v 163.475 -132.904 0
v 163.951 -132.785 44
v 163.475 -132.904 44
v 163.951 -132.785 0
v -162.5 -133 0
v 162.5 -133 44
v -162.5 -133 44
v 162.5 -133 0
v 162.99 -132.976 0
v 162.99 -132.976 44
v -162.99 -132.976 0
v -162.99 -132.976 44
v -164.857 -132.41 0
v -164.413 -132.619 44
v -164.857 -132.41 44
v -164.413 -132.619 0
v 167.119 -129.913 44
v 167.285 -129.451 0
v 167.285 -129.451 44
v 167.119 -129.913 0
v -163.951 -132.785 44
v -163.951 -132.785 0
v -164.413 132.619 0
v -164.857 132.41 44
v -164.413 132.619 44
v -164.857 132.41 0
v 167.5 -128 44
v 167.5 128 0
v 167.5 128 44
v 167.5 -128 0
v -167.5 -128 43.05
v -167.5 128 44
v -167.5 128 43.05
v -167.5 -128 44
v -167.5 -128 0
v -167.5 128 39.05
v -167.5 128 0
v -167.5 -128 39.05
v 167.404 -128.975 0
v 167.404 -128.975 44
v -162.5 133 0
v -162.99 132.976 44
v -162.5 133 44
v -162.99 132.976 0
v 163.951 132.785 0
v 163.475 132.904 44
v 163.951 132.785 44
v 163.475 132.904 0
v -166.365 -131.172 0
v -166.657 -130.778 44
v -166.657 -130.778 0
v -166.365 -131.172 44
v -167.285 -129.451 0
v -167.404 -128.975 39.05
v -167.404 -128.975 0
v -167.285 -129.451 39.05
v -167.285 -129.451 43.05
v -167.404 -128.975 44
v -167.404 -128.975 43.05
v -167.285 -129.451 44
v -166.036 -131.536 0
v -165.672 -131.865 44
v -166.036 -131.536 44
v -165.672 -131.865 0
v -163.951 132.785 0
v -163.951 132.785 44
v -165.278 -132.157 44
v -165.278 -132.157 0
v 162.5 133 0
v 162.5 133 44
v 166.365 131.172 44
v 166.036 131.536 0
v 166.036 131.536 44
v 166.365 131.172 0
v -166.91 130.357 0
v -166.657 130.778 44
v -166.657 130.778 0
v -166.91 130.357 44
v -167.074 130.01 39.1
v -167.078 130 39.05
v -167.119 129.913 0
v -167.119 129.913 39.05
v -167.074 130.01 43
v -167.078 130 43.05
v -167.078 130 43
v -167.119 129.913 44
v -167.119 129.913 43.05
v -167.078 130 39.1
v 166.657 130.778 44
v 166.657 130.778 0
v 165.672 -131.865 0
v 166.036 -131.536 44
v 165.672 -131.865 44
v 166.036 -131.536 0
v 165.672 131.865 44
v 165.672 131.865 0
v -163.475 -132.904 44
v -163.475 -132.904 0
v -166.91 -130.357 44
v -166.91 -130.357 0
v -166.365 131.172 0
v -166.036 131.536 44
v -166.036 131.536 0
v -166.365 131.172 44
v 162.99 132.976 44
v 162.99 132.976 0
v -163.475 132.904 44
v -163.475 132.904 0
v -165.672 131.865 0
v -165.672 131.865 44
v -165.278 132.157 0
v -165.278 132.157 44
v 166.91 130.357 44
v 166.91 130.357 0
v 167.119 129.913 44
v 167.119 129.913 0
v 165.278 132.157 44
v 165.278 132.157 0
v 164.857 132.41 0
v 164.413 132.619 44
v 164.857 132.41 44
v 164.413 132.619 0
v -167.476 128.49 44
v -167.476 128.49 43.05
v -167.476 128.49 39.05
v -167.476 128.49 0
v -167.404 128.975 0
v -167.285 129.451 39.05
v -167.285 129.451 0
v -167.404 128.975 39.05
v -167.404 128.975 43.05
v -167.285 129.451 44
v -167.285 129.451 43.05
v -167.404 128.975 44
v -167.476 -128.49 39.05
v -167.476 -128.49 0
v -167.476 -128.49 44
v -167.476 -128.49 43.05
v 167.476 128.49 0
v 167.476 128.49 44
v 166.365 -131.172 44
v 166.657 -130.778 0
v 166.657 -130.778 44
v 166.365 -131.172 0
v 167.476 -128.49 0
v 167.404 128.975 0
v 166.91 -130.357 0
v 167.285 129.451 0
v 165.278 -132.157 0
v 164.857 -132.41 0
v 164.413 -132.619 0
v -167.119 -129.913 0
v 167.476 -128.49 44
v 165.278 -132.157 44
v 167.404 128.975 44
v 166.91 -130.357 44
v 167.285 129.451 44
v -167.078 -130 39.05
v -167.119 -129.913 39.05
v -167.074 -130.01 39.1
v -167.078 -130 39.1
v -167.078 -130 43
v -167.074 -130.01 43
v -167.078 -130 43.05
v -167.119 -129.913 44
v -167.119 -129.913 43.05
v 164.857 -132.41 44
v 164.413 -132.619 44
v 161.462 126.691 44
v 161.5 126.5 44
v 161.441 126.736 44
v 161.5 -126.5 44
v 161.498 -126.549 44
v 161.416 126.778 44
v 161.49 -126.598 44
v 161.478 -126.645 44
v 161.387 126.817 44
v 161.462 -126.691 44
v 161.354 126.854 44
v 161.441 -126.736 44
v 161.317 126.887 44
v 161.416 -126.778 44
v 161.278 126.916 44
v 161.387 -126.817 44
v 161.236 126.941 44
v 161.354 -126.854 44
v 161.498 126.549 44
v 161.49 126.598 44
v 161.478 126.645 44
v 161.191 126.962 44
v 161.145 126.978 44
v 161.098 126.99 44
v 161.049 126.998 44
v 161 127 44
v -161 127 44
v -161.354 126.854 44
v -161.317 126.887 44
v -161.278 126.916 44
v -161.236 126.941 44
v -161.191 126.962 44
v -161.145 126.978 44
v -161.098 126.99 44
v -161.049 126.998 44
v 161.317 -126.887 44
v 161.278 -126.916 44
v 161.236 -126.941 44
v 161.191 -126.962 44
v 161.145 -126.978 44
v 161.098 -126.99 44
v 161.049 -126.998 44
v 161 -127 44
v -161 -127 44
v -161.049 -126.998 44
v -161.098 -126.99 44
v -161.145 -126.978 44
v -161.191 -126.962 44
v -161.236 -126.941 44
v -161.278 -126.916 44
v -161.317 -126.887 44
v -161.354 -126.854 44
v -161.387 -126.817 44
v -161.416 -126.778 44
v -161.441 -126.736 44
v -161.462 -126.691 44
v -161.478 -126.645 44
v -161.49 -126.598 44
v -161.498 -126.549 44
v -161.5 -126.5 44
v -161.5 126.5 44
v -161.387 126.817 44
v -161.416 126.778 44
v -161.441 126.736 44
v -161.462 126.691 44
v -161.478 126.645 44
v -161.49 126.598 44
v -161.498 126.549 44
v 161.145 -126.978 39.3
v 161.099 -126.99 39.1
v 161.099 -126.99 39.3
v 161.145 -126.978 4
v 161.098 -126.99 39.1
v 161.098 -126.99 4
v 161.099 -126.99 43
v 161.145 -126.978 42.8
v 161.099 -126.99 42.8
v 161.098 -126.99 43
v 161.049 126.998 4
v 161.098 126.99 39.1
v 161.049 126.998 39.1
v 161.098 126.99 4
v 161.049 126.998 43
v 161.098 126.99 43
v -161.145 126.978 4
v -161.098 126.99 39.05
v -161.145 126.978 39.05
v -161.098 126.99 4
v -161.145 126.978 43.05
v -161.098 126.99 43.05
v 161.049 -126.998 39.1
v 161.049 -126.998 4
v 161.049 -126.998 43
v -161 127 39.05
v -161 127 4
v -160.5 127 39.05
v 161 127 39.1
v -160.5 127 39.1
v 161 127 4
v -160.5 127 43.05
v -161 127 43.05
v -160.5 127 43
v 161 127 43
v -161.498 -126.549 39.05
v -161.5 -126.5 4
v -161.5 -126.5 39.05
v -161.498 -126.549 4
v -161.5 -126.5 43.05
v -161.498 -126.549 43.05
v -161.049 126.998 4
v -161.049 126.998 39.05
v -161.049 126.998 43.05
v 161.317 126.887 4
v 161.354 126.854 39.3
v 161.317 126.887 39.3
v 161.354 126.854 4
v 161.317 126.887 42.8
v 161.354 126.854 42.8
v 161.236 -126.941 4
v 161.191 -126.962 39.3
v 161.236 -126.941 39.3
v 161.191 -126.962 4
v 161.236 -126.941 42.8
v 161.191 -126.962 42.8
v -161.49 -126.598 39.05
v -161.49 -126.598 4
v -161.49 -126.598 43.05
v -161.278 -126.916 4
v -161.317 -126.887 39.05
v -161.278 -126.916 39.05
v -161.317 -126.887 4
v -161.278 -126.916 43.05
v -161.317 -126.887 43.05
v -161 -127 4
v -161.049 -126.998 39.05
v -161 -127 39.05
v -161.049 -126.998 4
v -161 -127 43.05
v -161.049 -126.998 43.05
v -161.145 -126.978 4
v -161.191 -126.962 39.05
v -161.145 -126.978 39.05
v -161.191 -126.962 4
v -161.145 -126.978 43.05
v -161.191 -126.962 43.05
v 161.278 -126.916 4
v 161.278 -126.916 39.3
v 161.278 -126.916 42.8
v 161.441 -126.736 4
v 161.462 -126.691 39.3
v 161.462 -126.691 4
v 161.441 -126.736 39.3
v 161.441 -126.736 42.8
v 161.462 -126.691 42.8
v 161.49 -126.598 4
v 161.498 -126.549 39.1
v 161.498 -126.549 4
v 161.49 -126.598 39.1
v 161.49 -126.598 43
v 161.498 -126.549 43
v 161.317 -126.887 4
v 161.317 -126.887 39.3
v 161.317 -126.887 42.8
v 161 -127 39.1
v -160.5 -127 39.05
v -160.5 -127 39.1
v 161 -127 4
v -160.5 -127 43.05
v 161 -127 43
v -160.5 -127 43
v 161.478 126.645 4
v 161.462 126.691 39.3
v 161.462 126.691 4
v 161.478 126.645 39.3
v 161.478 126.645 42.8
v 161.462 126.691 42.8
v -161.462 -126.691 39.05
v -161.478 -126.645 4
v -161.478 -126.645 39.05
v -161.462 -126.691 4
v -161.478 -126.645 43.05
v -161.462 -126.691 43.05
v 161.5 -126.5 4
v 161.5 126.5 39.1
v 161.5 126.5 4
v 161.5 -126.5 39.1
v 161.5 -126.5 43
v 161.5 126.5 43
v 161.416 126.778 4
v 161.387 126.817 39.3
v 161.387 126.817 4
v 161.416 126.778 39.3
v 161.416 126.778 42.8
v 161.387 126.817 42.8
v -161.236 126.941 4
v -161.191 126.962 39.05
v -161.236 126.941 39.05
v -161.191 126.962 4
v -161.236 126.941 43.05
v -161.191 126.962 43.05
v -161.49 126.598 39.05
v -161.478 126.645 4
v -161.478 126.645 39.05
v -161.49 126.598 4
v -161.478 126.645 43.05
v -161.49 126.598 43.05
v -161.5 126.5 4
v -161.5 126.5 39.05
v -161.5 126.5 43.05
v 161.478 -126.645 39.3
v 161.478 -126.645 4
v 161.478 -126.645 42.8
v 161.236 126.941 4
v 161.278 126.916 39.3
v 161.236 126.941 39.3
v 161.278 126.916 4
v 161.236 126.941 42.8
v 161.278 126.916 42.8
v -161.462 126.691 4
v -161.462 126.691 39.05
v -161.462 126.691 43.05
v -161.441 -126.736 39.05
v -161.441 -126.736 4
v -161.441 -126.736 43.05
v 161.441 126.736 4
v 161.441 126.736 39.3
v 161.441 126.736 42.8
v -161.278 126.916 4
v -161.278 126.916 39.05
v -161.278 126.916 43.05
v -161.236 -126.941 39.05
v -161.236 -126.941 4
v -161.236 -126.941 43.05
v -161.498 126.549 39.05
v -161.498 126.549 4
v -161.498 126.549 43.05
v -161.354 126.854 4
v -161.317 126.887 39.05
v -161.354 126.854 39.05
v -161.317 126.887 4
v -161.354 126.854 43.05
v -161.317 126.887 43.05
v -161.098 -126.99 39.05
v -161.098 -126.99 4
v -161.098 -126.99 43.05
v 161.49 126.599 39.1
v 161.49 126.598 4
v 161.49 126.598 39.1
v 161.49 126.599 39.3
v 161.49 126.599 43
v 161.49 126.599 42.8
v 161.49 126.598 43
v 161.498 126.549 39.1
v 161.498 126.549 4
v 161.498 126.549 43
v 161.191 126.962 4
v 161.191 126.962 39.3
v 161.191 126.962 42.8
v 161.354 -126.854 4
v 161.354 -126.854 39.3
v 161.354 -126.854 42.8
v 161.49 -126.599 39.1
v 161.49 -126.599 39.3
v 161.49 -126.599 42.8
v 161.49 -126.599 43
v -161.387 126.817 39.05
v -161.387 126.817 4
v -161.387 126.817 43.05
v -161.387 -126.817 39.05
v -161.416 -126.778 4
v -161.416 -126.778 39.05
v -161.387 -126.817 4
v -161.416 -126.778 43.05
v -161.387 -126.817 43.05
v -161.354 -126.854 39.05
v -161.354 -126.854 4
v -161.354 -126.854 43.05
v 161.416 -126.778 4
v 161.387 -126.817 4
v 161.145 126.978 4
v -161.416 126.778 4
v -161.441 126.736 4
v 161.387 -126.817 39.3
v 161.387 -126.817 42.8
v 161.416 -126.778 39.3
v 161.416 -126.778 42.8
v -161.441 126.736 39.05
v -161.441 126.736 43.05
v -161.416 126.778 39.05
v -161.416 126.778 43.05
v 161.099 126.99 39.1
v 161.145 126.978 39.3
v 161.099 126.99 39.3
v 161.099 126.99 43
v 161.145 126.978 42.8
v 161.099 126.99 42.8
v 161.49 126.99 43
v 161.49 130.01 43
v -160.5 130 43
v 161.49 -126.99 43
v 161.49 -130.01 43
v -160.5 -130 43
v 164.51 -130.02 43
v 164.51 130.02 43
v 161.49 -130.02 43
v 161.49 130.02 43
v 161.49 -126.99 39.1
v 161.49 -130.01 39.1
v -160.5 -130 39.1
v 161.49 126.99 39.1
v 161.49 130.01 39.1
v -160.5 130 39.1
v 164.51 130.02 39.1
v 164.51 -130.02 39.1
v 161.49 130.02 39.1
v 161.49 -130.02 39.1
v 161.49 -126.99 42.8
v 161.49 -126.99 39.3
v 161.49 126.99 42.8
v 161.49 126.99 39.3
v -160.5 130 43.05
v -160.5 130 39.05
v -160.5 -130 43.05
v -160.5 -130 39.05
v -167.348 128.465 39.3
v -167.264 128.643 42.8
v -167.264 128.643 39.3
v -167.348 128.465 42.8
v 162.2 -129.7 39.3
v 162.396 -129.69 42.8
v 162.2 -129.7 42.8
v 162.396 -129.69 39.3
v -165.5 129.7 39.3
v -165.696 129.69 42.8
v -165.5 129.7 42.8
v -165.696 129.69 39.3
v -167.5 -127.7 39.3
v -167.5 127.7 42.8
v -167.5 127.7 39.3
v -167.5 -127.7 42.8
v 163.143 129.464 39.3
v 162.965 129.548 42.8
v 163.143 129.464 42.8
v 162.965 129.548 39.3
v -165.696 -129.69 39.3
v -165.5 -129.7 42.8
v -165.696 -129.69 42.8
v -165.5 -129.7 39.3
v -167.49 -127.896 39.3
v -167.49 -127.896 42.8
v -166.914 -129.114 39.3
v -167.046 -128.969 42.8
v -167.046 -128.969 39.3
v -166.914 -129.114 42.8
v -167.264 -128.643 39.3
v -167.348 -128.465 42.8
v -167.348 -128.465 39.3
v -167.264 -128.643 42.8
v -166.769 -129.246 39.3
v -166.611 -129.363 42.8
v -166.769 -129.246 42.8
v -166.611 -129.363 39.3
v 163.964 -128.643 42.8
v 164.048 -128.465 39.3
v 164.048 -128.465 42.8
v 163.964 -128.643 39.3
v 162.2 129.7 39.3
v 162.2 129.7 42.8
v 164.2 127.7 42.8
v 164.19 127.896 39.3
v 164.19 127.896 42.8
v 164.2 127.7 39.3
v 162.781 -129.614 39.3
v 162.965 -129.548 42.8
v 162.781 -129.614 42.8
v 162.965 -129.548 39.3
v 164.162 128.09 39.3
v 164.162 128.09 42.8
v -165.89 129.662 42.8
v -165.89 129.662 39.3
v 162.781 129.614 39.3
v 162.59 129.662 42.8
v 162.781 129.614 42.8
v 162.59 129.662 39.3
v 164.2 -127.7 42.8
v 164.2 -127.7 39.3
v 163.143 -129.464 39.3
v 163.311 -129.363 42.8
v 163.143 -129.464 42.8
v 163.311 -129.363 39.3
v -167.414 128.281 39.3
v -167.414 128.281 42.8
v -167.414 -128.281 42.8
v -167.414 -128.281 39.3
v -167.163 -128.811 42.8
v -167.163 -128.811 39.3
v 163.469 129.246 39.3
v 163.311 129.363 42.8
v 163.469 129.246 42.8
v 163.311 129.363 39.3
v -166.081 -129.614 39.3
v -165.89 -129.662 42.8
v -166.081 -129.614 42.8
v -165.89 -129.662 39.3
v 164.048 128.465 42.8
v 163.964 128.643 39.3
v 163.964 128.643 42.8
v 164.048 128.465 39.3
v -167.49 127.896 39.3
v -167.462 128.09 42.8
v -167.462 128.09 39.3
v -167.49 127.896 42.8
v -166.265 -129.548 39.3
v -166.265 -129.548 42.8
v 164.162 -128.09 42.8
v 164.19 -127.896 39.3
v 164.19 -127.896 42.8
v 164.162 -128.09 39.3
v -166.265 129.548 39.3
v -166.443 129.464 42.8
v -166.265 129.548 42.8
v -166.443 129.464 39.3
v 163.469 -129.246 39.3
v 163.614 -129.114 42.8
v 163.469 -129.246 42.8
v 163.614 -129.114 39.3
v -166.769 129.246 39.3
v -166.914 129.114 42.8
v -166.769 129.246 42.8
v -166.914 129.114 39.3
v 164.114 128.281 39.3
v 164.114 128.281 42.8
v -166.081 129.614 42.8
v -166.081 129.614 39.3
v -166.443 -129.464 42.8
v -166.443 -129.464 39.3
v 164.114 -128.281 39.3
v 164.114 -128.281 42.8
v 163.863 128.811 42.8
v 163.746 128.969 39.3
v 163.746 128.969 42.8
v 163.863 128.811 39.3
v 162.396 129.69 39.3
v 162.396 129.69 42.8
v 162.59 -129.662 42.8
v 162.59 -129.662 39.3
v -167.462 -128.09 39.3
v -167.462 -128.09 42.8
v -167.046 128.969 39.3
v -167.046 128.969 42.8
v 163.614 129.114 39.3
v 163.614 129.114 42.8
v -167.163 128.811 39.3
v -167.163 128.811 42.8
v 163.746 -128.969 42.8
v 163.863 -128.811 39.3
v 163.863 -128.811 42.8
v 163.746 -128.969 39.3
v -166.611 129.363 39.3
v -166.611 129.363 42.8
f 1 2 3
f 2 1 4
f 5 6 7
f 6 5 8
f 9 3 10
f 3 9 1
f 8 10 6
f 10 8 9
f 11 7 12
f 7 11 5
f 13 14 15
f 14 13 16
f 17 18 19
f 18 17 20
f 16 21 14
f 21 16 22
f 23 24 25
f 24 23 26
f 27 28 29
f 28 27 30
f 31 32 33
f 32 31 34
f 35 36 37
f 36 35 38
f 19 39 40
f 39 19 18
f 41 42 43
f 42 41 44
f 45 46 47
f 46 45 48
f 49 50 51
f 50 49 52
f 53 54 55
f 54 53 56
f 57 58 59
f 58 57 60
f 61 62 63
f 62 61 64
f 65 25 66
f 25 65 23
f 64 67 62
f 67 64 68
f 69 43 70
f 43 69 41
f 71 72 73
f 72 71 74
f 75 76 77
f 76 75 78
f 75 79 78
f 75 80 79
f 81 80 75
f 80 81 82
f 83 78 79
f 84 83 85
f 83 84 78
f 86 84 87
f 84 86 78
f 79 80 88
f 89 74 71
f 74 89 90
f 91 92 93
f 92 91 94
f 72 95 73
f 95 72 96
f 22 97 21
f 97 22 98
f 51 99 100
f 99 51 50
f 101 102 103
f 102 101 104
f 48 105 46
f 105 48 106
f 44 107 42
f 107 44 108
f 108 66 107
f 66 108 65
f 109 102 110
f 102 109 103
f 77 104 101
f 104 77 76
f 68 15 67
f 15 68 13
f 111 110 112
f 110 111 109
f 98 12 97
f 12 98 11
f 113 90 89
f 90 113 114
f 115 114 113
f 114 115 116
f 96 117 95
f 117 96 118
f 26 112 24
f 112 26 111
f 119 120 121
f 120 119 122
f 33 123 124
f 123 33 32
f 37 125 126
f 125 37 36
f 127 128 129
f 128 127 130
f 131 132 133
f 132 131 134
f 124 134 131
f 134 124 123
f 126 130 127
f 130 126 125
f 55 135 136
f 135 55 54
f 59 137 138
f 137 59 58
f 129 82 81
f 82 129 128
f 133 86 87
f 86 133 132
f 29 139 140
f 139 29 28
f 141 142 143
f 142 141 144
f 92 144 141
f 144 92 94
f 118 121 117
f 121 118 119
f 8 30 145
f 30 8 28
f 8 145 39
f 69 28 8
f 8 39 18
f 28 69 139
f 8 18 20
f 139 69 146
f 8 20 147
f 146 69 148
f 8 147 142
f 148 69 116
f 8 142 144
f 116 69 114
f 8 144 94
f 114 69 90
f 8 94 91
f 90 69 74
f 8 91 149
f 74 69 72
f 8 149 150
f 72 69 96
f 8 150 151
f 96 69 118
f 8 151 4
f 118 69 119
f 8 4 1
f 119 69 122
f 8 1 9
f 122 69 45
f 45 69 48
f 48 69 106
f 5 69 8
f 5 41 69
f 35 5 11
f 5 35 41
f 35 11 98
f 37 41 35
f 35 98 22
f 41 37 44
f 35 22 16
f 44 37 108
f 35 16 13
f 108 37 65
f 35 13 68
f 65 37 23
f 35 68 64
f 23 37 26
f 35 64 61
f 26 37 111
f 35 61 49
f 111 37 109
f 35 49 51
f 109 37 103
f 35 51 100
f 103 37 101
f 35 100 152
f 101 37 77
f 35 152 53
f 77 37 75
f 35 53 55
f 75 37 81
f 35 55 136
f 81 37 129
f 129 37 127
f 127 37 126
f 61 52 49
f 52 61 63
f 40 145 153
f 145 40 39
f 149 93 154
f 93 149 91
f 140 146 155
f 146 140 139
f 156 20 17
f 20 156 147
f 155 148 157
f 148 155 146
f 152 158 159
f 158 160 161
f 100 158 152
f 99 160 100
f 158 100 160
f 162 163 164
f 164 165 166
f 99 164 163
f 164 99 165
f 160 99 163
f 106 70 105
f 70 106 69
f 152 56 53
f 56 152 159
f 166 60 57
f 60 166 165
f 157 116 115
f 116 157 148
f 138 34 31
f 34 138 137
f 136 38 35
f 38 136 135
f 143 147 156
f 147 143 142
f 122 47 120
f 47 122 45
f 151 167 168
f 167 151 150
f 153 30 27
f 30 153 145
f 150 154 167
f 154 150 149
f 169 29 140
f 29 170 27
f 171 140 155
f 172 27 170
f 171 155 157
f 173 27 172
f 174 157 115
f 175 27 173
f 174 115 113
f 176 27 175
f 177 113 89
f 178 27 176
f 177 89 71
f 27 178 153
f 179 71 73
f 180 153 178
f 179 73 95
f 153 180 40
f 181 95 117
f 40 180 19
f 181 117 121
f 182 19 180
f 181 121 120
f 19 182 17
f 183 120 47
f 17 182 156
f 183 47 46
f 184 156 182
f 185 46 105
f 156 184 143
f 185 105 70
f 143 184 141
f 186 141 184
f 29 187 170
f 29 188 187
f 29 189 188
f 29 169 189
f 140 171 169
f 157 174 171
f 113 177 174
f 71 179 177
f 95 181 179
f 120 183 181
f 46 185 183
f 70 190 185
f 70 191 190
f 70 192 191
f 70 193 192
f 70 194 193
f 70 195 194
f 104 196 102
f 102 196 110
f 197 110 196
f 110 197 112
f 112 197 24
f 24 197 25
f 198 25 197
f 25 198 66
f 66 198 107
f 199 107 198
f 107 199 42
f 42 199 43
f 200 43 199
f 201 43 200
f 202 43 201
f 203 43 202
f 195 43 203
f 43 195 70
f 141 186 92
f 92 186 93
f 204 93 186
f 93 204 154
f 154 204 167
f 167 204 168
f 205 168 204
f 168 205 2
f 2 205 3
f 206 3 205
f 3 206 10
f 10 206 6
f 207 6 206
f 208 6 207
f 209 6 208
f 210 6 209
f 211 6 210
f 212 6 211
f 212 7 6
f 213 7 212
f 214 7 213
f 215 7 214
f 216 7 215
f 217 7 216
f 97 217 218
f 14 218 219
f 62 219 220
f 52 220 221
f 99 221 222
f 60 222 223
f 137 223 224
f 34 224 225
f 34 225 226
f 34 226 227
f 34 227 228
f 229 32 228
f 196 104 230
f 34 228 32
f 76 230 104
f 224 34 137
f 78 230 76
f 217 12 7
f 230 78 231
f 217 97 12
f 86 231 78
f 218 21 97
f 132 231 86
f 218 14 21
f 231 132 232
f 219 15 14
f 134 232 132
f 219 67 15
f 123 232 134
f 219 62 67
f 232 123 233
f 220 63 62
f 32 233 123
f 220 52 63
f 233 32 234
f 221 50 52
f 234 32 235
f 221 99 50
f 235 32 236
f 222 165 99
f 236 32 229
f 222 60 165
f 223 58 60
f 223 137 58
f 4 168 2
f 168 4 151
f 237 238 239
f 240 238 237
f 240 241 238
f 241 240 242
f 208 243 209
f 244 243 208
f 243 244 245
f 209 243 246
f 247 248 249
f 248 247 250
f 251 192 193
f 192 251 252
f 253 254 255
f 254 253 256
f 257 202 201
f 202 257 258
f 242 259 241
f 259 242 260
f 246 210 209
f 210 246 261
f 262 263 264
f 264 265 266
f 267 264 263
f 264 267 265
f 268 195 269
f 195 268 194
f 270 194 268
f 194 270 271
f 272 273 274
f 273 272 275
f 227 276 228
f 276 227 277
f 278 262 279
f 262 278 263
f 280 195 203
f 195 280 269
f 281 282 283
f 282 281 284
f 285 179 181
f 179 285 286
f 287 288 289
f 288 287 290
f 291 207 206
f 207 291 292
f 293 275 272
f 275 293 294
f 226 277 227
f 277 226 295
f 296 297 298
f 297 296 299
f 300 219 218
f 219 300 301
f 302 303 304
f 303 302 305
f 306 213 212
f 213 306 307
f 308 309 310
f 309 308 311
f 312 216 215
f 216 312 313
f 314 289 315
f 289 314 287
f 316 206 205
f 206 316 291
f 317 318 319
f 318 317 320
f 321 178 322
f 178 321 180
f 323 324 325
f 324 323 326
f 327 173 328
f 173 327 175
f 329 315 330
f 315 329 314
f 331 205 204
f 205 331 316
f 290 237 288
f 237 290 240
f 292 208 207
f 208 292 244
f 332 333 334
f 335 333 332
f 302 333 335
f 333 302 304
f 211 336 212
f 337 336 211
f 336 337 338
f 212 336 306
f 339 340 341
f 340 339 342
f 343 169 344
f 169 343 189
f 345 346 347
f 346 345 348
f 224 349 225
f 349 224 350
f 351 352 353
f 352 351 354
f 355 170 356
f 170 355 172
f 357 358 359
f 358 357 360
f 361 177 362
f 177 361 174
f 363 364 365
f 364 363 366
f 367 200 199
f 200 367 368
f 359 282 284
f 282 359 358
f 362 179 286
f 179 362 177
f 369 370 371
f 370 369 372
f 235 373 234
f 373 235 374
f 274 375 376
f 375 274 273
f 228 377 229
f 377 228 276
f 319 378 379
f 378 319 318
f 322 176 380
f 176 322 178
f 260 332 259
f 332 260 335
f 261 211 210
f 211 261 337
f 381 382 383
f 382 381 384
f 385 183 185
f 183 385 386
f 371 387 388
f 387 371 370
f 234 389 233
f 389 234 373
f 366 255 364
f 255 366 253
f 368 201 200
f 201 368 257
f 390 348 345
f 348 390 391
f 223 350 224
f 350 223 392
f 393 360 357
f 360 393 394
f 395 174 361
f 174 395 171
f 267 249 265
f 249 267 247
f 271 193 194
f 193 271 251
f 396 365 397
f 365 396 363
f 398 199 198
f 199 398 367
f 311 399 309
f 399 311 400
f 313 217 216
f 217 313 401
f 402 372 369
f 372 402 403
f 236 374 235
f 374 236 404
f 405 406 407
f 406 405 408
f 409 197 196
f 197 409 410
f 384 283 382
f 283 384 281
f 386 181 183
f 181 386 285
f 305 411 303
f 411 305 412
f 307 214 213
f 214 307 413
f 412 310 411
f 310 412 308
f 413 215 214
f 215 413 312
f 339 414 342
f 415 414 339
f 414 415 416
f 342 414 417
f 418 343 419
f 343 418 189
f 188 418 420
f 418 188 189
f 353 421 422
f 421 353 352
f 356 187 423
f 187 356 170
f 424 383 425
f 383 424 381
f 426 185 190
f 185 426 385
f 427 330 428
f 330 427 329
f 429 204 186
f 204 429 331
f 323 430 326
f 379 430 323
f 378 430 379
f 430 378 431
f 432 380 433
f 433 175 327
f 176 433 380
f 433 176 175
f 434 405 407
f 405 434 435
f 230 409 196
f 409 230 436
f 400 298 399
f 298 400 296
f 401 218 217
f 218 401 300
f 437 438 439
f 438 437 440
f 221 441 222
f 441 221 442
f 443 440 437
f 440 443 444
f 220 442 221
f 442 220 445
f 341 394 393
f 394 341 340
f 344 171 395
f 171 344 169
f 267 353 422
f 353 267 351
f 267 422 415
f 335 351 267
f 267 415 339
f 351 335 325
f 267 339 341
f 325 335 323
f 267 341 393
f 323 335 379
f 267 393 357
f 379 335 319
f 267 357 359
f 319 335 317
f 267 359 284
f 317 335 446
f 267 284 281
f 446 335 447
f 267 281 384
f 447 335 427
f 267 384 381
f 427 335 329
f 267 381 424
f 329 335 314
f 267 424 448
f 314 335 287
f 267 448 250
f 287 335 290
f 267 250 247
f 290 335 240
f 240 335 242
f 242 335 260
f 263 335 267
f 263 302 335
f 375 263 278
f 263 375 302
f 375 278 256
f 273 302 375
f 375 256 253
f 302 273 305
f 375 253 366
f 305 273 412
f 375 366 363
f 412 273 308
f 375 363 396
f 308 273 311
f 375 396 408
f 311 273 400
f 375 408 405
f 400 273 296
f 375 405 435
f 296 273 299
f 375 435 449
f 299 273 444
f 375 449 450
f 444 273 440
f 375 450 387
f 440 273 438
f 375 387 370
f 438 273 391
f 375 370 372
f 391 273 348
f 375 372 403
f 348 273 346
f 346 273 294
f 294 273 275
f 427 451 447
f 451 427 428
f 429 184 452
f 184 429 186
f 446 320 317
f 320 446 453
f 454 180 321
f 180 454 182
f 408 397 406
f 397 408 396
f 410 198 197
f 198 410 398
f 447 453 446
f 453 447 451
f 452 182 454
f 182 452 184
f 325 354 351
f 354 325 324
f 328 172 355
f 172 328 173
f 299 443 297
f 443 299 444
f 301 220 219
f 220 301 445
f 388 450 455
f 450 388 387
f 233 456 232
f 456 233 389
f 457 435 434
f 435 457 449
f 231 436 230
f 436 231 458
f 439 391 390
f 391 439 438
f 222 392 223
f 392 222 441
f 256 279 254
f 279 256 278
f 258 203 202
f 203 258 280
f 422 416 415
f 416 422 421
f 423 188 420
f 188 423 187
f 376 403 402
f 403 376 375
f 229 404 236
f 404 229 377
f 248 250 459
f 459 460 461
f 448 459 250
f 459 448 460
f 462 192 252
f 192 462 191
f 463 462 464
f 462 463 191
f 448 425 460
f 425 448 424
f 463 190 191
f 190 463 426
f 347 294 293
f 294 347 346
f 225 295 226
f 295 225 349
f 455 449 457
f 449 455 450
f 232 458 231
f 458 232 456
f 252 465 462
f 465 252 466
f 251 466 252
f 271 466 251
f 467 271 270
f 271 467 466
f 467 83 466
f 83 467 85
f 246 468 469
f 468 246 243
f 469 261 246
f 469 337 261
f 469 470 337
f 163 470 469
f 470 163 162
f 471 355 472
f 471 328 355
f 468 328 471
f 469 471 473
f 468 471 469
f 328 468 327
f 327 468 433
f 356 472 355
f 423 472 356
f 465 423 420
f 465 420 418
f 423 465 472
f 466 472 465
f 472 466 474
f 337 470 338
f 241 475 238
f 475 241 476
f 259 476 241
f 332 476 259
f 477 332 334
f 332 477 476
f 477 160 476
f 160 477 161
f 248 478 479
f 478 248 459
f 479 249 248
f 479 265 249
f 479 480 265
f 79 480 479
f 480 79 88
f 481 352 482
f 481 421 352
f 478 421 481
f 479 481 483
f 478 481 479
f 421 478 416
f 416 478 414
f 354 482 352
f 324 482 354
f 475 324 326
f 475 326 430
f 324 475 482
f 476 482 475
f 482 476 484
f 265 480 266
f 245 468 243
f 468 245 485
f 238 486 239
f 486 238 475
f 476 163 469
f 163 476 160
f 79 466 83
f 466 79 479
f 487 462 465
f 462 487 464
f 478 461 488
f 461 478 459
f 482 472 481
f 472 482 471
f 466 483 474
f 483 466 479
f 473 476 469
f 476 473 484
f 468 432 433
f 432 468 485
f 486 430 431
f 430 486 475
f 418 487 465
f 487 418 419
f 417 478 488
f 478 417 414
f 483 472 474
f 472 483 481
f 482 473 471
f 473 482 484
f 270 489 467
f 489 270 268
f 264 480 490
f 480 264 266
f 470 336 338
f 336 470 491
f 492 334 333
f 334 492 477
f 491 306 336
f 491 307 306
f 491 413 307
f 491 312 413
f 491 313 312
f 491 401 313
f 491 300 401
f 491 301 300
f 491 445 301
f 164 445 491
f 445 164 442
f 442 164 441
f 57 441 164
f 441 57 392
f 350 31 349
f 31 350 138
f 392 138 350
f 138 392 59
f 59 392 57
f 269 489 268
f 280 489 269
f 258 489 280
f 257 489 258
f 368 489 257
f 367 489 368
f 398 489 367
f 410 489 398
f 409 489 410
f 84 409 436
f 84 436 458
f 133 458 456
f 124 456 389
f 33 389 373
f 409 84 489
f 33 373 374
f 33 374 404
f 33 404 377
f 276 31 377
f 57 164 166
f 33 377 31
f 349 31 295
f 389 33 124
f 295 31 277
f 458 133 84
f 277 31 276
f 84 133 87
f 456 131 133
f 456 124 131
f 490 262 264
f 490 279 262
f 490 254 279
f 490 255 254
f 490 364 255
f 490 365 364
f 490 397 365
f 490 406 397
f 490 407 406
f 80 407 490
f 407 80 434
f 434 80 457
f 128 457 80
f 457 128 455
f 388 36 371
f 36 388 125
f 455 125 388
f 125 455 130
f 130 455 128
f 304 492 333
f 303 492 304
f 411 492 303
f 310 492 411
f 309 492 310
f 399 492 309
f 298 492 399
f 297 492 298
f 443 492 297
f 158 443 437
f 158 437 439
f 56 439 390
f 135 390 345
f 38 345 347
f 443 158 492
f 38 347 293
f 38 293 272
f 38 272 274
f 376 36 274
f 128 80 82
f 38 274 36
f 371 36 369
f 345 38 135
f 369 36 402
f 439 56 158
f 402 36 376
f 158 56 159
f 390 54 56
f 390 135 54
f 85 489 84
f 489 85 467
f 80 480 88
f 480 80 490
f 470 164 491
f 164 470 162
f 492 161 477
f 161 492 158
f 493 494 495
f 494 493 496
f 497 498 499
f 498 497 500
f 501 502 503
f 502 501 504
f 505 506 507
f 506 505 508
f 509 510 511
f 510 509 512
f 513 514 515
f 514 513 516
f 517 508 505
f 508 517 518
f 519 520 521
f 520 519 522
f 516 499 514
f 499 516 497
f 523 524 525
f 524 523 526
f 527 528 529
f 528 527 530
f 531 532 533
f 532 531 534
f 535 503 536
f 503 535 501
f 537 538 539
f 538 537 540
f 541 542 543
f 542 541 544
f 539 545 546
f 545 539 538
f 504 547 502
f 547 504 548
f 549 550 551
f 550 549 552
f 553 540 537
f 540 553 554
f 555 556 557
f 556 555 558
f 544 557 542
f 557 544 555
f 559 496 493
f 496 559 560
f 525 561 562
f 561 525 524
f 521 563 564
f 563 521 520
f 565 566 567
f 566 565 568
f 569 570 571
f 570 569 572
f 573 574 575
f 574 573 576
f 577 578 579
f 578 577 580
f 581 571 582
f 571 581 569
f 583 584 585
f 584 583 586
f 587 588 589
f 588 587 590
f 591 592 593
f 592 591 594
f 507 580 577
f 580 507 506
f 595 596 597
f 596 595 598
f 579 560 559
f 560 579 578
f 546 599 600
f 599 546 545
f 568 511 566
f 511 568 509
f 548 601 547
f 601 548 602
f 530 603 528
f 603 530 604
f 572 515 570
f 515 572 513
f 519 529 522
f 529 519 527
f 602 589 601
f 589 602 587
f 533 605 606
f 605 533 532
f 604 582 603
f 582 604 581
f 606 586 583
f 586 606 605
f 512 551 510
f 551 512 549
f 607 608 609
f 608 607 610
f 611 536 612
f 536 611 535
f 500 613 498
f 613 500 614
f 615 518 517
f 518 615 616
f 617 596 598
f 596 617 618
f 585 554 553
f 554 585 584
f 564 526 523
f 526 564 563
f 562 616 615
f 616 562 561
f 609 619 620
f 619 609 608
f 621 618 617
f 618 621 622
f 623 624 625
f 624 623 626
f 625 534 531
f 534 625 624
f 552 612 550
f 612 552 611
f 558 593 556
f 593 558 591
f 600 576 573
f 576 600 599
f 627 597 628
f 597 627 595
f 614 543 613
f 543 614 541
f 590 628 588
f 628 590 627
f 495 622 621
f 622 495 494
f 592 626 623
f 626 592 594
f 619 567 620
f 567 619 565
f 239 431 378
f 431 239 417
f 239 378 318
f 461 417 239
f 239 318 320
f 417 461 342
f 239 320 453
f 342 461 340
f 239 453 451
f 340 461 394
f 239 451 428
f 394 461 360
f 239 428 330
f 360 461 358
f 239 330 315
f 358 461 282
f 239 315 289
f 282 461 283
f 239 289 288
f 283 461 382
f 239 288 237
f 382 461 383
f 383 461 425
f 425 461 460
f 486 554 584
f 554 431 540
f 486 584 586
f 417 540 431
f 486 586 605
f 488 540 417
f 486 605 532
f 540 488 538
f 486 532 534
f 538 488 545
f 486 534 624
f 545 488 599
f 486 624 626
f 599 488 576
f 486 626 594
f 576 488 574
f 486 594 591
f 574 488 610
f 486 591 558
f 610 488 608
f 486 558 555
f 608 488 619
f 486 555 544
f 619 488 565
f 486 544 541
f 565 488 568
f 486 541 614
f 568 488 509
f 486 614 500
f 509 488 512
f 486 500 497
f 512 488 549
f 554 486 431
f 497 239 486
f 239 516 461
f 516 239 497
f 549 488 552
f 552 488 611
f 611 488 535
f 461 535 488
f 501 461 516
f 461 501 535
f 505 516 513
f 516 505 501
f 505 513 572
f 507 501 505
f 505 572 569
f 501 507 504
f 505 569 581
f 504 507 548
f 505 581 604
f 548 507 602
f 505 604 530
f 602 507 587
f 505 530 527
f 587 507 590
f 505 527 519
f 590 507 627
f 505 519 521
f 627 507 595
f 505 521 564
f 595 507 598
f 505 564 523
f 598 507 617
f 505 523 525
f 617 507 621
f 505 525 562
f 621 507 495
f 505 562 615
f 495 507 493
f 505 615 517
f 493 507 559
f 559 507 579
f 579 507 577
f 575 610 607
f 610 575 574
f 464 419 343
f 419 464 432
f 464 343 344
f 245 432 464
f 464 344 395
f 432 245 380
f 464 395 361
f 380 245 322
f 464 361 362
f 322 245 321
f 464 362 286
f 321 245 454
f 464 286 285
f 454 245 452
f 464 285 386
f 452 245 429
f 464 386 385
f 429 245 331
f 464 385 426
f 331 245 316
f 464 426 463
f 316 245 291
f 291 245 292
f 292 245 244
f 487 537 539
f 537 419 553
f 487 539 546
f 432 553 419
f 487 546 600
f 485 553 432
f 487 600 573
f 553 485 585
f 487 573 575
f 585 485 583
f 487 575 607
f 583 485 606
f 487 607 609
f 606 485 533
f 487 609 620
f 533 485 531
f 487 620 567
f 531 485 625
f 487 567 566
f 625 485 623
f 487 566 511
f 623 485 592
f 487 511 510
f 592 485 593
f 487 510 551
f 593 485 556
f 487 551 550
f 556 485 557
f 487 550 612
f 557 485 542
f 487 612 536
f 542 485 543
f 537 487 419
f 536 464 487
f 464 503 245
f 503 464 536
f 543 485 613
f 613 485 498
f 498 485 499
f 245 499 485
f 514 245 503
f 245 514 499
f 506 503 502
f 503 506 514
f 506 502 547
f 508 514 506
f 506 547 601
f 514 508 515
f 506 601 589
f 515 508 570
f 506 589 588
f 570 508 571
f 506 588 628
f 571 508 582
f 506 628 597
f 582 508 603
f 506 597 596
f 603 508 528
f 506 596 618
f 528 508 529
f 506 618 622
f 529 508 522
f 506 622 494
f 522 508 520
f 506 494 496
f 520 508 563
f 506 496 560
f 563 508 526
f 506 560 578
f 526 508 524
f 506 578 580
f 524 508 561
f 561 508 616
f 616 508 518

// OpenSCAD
// ============================================================
// STORAGE BOX - COMBINED BASE + SLIDING LID
// Side grooves + rear/end receiving groove are cut INTO walls
// Units: mm
// ============================================================

$fn = 64;

// ============================================================
// DISPLAY
// ============================================================

view = "closed";
// "closed"   = lid fully inserted into side + rear grooves
// "exploded" = lid pulled forward for inspection

exploded_distance = 90;

// ============================================================
// MAIN EXTERNAL DIMENSIONS
// ============================================================

box_length = 335;       // X
box_width  = 266;       // Y
box_height = 44;        // Z

// ============================================================
// STRUCTURE
// ============================================================

wall_thickness = 6.0;
base_thickness = 4.0;
corner_radius  = 5.0;

// ============================================================
// SLIDING LID / GROOVE PARAMETERS
// ============================================================

lid_thickness          = 3.5;
lid_side_clearance     = 0.30;
lid_vertical_clearance = 0.40;
lid_end_clearance      = 0.30;
entry_clearance        = 0.30;

side_groove_depth = 3.0;
rear_groove_depth = 3.0;

upper_lip_thickness = 1.0;

lid_corner_radius = 2.0;

// ============================================================
// DERIVED DIMENSIONS
// ============================================================

internal_width = box_width - 2 * wall_thickness;

groove_height = lid_thickness + lid_vertical_clearance;
groove_top    = box_height - upper_lip_thickness;
groove_bottom = groove_top - groove_height;

lid_width =
    internal_width
    + 2 * (side_groove_depth - lid_side_clearance);

rear_groove_width =
    internal_width
    + 2 * side_groove_depth
    + 0.04;

// Front edge flush with front outside face.
// Rear edge enters rear receiving groove by
// rear_groove_depth - lid_end_clearance.
lid_length =
    box_length
    - wall_thickness
    + rear_groove_depth
    - lid_end_clearance;

entry_slot_width  = lid_width + 2 * entry_clearance;
entry_slot_height = groove_height + 0.10;

// Lid is centred vertically within the 0.40 mm clearance.
closed_lid_z =
    groove_bottom
    + lid_vertical_clearance / 2;

// Closed lid front edge = -box_length/2.
// Rear edge = rear groove bottom minus lid_end_clearance.
closed_lid_x =
    (-wall_thickness + rear_groove_depth - lid_end_clearance) / 2;

// ============================================================
// HELPERS
// ============================================================

module rounded_rectangle_2d(length, width, radius)
{
    r = min(radius, min(length, width) / 2);

    offset(r = r)
        square([
            length - 2 * r,
            width  - 2 * r
        ], center = true);
}

module rounded_box(length, width, height, radius)
{
    linear_extrude(height = height)
        rounded_rectangle_2d(length, width, radius);
}

// ============================================================
// SIDE GROOVE
// ============================================================

module side_groove(side)
{
    groove_center_y =
        side * (
            box_width / 2
            - wall_thickness
            + side_groove_depth / 2
        );

    groove_front_x = -box_length / 2 - 1;
    groove_rear_x  =  box_length / 2 - wall_thickness + 0.05;

    groove_length   = groove_rear_x - groove_front_x;
    groove_center_x = (groove_front_x + groove_rear_x) / 2;

    translate([
        groove_center_x,
        groove_center_y,
        groove_bottom + groove_height / 2
    ])
        cube([
            groove_length,
            side_groove_depth + 0.02,
            groove_height
        ], center = true);
}

// ============================================================
// REAR / END RECEIVING GROOVE
// ============================================================

module rear_receiving_groove()
{
    groove_center_x =
        box_length / 2
        - wall_thickness
        + rear_groove_depth / 2;

    translate([
        groove_center_x,
        0,
        groove_bottom + groove_height / 2
    ])
        cube([
            rear_groove_depth + 0.02,
            rear_groove_width,
            groove_height
        ], center = true);
}

// ============================================================
// FRONT ENTRY SLOT
// ============================================================

module front_entry_slot()
{
    translate([
        -box_length / 2 - 1,
        -entry_slot_width / 2,
        groove_bottom - 0.05
    ])
        cube([
            wall_thickness + 2,
            entry_slot_width,
            entry_slot_height
        ], center = false);
}

// ============================================================
// BASE
// ============================================================

module storage_box_base()
{
    difference()
    {
        rounded_box(
            box_length,
            box_width,
            box_height,
            corner_radius
        );

        translate([0, 0, base_thickness])
            linear_extrude(
                height = box_height - base_thickness + 1
            )
                rounded_rectangle_2d(
                    box_length - 2 * wall_thickness,
                    box_width  - 2 * wall_thickness,
                    max(0.5, corner_radius - wall_thickness)
                );

        side_groove(-1);
        side_groove(1);
        rear_receiving_groove();
        front_entry_slot();
    }
}

// ============================================================
// LID
// ============================================================

module storage_box_lid()
{
    rounded_box(
        lid_length,
        lid_width,
        lid_thickness,
        lid_corner_radius
    );
}

// ============================================================
// COMBINED VIEWS
// ============================================================

module closed_assembly()
{
    storage_box_base();

    translate([
        closed_lid_x,
        0,
        closed_lid_z
    ])
        storage_box_lid();
}

module exploded_assembly()
{
    storage_box_base();

    translate([
        closed_lid_x - exploded_distance,
        0,
        closed_lid_z
    ])
        storage_box_lid();
}

// ============================================================
// OUTPUT
// ============================================================

if (view == "exploded")
    exploded_assembly();
else
    closed_assembly();
